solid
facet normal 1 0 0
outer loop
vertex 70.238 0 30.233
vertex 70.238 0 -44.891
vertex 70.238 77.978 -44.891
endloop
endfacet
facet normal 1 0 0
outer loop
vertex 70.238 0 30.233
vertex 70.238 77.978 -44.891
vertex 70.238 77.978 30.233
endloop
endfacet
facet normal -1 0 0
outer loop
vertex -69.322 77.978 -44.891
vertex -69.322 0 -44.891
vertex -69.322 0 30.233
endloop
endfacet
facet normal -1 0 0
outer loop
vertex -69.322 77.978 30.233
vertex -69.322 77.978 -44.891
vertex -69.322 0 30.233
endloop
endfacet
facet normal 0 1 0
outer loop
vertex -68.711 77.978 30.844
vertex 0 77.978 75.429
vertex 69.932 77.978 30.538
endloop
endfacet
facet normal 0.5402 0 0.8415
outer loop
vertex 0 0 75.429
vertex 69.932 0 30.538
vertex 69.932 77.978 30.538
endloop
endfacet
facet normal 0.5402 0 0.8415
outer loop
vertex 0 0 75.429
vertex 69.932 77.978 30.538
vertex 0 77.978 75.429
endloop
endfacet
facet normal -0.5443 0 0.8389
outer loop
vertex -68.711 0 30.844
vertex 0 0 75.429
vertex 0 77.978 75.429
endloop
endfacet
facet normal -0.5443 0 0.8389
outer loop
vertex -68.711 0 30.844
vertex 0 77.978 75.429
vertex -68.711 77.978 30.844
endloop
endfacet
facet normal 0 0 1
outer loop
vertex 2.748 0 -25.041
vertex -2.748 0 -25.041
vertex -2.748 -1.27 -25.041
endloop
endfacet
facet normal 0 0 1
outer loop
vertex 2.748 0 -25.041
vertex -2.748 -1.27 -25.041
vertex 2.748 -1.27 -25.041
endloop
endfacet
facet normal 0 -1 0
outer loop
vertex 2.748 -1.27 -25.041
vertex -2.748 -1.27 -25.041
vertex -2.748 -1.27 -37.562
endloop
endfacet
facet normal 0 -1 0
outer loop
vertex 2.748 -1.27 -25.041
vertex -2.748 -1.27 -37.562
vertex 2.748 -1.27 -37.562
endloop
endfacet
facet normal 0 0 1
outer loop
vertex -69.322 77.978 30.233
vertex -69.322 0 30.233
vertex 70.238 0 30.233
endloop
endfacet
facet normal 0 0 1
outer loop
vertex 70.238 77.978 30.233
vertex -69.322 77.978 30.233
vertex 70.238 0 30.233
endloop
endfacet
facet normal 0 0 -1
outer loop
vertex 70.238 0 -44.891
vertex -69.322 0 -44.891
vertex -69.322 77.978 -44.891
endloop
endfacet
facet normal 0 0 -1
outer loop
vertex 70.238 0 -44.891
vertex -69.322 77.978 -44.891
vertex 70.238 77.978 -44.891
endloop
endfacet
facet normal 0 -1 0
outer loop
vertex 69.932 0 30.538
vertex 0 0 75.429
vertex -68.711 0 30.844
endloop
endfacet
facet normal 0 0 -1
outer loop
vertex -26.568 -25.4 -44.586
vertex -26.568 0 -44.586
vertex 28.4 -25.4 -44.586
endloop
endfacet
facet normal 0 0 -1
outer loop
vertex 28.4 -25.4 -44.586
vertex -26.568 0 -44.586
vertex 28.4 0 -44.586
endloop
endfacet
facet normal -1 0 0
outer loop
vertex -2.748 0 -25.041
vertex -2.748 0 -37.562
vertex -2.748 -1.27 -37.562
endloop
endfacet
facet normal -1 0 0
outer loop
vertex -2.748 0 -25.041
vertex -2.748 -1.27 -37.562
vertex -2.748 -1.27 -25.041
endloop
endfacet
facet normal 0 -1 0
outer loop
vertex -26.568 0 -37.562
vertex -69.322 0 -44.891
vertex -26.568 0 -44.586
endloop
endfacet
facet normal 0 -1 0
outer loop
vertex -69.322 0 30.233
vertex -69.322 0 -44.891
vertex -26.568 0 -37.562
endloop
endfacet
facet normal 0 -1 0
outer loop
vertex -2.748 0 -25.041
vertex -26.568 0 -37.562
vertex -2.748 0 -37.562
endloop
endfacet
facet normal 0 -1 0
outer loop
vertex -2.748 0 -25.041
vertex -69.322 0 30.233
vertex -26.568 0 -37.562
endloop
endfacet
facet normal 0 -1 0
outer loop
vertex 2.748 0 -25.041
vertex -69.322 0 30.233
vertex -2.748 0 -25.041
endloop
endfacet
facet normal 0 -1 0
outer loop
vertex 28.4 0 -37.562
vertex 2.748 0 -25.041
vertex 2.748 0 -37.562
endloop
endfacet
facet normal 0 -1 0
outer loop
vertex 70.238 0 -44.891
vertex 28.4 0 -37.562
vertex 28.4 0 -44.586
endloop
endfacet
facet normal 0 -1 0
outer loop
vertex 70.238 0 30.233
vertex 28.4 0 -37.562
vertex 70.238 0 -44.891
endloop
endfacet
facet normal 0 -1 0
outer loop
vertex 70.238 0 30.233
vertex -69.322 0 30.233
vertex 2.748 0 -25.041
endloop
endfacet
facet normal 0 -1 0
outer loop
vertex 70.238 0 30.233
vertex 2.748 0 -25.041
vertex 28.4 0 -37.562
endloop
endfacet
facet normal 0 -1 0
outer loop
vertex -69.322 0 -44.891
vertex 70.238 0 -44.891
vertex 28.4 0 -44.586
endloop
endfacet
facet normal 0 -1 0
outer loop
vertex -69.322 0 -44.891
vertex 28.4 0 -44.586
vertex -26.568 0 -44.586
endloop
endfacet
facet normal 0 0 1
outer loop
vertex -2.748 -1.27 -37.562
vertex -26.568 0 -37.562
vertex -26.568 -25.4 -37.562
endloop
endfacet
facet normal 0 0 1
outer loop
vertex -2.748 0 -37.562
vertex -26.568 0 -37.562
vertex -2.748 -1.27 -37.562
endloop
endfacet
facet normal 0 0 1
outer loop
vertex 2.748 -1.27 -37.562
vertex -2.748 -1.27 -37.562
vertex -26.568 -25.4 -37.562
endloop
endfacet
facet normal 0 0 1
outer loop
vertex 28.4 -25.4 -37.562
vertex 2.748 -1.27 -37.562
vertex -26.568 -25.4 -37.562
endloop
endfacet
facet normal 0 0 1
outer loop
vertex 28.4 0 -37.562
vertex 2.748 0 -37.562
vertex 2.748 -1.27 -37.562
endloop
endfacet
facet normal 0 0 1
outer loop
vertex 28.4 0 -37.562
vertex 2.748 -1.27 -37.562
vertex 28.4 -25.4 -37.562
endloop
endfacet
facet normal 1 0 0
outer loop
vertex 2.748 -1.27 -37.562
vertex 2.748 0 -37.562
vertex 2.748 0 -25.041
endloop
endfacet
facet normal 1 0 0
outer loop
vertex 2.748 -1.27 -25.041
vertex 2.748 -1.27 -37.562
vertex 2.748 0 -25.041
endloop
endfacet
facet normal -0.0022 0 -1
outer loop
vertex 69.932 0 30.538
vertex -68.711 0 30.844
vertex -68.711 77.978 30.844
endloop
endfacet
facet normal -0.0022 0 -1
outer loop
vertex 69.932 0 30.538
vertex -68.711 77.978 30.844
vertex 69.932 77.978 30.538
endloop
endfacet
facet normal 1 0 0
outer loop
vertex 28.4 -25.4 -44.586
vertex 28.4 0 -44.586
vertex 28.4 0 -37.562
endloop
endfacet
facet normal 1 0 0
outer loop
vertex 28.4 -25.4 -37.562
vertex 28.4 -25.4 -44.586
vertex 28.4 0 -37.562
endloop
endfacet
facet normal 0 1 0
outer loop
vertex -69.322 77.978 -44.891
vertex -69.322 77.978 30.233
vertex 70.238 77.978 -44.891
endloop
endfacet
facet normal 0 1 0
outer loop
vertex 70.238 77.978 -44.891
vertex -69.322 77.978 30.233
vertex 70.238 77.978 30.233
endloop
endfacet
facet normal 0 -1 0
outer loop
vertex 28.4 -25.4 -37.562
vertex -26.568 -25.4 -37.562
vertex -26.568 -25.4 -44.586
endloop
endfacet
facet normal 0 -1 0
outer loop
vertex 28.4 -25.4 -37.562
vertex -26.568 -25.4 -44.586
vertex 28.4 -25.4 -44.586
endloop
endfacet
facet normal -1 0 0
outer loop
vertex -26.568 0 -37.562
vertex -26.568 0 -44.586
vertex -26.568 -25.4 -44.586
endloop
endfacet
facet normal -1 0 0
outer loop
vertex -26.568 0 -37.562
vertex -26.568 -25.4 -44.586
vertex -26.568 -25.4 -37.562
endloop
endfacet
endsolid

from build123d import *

# Parameters (mm, degrees)
F0_W     = 139.559426
F0_H     = 75.123895
F1_DEPTH = 77.978
F3_DEPTH = 77.978
F5_W     = 54.968702
F5_H     = 7.023781
F6_DEPTH = 25.4
F7_W     = 5.496873
F7_H     = 13.131412
F8_DEPTH = 1.27


with BuildPart() as f1:
    # F0 (on Front) → F1 (new body)
    with BuildSketch(Plane.XZ):
        with Locations((0.458073, -7.32916)):
            Rectangle(F0_W, F0_H)
    extrude(amount=-F1_DEPTH)

    # F5 (on face) → F6 (join)
    with BuildSketch(Plane.XZ):
        with Locations((0.916145, -41.073836)):
            Rectangle(F5_W, F5_H)
    extrude(amount=F6_DEPTH)

    # F7 (on face) → F8 (join)
    with BuildSketch(Plane.XZ):
        with Locations((1e-06, -31.607005)):
            Rectangle(F7_W, F7_H)
    extrude(amount=F8_DEPTH)


with BuildPart() as f3:
    # F2 (on Front) → F3 (new body)
    with BuildSketch(Plane.XZ):
        Polygon((0, 75.429276), (-68.710878, 30.843548), (69.932409, 30.538168), align=None)
    extrude(amount=-F3_DEPTH)


solid = Compound([f1.part, f3.part])
